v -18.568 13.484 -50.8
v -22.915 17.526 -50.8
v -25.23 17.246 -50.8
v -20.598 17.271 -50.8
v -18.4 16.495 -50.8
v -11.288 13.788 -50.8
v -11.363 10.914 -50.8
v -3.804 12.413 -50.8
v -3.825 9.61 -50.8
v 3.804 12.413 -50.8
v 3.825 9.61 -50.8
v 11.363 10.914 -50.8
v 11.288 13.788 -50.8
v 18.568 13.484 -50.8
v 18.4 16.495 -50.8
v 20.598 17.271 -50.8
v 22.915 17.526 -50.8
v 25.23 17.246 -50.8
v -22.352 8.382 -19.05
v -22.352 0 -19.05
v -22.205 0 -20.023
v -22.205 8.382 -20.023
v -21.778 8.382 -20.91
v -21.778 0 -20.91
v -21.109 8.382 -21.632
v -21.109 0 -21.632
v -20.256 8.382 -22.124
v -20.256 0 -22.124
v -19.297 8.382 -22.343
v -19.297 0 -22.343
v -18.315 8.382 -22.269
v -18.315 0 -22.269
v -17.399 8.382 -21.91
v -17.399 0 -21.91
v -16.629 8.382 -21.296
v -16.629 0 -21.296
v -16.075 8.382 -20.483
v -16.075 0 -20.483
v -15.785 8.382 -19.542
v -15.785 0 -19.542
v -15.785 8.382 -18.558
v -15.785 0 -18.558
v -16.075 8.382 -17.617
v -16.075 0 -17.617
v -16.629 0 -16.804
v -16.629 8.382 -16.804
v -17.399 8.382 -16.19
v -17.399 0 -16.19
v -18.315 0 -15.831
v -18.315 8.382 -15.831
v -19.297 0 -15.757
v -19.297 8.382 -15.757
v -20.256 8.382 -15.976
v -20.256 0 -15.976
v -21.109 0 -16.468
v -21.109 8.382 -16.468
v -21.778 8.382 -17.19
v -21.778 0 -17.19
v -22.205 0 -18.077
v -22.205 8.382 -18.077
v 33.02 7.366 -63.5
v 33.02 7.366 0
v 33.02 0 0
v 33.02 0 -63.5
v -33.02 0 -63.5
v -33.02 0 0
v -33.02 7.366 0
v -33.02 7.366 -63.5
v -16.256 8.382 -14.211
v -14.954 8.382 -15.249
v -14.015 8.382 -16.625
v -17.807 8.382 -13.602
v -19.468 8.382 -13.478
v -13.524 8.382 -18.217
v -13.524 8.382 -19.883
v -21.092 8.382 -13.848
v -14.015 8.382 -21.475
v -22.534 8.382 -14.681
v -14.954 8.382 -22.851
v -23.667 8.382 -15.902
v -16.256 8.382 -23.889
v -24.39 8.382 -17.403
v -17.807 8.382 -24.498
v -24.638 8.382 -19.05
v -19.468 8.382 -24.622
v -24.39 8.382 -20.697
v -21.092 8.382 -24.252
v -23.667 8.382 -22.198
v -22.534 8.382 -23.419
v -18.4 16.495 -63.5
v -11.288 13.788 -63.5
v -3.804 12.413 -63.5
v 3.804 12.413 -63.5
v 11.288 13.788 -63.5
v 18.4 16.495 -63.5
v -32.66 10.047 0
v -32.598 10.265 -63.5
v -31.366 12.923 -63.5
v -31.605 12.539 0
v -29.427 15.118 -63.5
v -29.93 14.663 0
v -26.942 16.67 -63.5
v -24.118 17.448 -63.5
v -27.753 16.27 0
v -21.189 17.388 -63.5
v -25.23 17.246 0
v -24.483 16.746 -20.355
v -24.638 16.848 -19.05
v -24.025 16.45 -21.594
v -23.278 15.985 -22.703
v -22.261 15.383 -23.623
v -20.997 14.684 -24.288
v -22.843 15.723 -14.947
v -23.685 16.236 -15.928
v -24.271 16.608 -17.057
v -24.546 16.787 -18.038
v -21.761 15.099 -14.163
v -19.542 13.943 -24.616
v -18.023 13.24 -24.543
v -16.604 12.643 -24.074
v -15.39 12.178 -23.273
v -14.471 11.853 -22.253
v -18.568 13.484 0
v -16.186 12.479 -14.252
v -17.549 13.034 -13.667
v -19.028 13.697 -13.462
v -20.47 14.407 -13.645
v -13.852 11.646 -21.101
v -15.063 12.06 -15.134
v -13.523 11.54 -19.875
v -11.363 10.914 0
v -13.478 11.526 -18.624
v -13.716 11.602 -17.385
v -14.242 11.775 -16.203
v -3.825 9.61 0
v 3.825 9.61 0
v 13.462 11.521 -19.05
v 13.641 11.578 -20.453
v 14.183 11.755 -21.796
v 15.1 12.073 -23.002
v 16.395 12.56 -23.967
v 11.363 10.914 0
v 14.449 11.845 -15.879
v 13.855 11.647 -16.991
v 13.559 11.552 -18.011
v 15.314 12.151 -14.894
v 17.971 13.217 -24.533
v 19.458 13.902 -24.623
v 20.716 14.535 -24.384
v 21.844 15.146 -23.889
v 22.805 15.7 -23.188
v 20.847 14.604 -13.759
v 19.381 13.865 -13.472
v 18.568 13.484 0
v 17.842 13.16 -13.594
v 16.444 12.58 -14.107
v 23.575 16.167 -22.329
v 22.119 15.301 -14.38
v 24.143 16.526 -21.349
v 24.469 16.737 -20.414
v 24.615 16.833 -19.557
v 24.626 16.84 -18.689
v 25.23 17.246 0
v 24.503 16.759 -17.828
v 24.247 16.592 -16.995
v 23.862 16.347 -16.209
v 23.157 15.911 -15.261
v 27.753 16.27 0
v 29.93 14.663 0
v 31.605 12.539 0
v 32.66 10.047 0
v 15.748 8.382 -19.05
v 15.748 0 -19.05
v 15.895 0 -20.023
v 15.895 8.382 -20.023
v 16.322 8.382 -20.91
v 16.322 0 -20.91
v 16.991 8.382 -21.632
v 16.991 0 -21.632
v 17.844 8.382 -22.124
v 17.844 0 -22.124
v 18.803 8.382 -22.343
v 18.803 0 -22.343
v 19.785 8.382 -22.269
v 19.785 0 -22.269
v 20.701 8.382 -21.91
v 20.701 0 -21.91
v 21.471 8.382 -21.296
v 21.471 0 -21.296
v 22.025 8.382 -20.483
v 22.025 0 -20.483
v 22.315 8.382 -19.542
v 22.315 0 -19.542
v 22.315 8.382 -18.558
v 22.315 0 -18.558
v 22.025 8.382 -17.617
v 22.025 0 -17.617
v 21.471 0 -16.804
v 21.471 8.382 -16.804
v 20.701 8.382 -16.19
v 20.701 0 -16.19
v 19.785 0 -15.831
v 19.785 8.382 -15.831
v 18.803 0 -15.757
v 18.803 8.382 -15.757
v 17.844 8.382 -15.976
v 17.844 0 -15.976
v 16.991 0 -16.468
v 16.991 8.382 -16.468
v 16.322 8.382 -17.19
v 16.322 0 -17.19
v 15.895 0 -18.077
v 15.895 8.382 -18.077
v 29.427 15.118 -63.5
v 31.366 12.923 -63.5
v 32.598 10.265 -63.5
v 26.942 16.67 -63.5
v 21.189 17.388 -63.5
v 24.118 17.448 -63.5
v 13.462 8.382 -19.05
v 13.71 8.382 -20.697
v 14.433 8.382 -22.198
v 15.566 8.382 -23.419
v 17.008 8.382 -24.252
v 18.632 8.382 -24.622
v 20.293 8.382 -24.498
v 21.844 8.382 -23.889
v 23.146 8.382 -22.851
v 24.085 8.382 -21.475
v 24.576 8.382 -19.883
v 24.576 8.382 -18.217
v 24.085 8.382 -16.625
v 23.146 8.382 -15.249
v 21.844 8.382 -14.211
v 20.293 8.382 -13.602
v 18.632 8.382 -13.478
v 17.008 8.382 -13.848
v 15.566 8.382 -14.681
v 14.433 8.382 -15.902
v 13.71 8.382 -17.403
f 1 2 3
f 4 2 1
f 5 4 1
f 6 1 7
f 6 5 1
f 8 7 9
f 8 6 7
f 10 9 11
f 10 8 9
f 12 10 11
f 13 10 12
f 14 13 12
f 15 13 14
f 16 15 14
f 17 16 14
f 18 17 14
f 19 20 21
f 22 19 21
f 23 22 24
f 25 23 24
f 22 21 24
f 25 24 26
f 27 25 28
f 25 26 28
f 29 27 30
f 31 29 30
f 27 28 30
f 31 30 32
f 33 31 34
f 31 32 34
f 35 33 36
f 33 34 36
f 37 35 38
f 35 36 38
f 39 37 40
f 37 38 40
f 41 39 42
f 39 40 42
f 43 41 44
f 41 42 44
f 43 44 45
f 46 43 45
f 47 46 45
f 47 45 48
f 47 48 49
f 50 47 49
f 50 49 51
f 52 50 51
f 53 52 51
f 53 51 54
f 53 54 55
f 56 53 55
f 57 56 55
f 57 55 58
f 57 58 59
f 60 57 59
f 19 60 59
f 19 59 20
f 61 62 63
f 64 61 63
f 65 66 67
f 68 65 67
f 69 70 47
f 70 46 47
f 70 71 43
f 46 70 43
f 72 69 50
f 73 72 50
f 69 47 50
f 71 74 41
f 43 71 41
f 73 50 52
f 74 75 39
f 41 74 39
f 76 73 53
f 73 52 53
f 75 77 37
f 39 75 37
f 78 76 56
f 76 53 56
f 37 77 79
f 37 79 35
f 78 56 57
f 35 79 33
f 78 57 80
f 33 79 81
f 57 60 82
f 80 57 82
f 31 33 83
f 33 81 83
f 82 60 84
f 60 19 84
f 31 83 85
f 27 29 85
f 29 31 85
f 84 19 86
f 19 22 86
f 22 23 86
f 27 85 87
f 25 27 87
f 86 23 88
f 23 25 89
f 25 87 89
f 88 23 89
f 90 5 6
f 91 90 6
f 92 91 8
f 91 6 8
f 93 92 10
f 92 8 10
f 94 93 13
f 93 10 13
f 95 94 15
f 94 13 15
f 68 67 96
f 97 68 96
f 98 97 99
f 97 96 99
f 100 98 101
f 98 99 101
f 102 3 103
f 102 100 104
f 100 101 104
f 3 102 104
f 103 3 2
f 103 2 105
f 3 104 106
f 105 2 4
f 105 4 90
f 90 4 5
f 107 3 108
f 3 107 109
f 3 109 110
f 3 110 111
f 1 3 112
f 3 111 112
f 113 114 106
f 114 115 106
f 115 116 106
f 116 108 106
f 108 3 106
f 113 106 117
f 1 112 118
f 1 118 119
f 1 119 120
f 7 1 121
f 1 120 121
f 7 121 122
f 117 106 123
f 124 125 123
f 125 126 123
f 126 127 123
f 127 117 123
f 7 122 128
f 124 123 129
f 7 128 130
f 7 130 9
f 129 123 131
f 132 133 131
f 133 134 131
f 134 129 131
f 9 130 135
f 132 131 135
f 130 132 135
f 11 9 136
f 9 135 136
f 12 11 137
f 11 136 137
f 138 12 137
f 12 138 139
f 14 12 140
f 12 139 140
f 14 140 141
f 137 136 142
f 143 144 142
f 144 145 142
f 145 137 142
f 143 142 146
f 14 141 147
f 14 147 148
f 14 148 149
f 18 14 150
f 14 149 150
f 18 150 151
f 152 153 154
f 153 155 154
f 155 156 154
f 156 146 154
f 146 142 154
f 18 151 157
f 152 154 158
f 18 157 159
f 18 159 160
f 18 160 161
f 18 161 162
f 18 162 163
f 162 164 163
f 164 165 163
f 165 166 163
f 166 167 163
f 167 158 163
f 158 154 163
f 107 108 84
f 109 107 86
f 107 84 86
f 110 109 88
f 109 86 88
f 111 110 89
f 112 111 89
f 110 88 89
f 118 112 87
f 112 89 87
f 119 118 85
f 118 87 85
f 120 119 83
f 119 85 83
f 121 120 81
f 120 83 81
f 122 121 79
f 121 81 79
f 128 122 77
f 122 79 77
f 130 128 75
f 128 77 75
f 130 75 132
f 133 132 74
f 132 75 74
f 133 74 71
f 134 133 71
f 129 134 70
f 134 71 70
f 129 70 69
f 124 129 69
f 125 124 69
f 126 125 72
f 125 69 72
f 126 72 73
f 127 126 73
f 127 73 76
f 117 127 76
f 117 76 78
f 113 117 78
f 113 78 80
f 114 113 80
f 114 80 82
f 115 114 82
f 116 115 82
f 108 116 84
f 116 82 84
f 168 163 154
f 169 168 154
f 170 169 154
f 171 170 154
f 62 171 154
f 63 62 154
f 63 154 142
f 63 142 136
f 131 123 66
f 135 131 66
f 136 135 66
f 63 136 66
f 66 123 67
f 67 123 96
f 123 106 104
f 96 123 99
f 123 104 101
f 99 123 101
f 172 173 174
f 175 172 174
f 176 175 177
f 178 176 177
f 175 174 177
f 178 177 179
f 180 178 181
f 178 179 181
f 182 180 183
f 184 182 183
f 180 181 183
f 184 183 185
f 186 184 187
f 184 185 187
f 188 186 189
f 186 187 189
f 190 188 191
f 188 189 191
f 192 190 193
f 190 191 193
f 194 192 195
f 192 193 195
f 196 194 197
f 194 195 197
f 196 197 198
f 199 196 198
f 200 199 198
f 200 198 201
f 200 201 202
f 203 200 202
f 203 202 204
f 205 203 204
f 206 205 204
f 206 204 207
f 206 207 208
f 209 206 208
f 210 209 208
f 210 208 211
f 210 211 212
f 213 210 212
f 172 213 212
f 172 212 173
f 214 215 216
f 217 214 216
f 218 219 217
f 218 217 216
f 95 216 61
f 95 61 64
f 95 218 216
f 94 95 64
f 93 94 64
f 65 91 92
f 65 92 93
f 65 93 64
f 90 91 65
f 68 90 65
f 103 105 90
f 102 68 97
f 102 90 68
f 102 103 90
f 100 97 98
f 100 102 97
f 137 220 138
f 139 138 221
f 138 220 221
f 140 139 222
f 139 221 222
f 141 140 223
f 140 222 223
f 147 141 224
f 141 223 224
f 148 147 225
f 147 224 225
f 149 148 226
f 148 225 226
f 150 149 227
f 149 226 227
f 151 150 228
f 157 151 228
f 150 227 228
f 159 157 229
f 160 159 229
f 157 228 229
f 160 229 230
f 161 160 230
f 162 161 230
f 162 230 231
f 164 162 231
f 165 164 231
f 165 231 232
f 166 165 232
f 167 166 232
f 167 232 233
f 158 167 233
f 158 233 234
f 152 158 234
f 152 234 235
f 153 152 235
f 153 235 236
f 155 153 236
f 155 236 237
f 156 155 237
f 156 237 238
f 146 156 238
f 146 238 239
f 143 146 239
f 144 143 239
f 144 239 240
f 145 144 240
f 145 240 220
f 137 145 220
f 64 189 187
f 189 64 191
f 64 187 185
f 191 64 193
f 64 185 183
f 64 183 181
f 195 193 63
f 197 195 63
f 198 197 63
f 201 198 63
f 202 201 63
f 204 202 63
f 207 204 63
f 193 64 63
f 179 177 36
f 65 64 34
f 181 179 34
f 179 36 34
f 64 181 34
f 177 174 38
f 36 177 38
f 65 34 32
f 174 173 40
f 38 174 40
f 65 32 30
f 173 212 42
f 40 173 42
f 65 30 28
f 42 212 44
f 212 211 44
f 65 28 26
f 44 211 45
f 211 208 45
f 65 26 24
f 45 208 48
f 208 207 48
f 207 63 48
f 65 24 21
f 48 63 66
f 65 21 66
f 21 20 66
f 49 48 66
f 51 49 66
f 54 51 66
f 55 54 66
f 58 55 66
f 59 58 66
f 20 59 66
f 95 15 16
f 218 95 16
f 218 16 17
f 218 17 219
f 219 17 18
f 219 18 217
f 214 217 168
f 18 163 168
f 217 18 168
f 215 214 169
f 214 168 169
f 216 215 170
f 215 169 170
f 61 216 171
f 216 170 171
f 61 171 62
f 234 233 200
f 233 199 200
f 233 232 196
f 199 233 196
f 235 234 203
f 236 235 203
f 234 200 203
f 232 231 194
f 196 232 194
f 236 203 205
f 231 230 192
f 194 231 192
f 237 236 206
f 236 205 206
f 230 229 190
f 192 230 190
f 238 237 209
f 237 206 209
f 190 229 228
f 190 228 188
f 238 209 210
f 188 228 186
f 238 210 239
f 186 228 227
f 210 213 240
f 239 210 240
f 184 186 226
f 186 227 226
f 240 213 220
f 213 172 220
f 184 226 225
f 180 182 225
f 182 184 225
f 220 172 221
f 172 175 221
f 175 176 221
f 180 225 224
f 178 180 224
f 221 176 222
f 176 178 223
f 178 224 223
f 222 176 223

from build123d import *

# Parameters (mm, degrees)
BOSS_EXTRUDE1_DEPTH = 63.5
SKETCH7_R           = 44.704
CUT_EXTRUDE1_DEPTH  = 50.8
SKETCH8_R           = 3.302
CUT_EXTRUDE2_DEPTH  = 18.526
SKETCH9_R           = 5.588
CUT_EXTRUDE3_DEPTH  = 10.144


with BuildPart() as part:
    # Sketch2 → Boss-Extrude1 (new body)
    with BuildSketch(Plane.XY):
        with BuildLine():
            Line((-33.02, 0), (-33.02, 7.366))
            ThreePointArc((-33.02, 7.366), (-28.240847698, 15.984124973), (-18.399512195, 16.494507465))
            ThreePointArc((-18.399512195, 16.494507465), (0, 12.239600759), (18.399512195, 16.494507465))
            ThreePointArc((18.399512195, 16.494507465), (28.240847698, 15.984124973), (33.02, 7.366))
            Line((33.02, 7.366), (33.02, 0))
            Line((33.02, 0), (-33.02, 0))
        make_face()
    extrude(amount=-BOSS_EXTRUDE1_DEPTH)

    # Sketch7 → Cut-Extrude1 (cut)
    with BuildSketch(Plane.XY):
        with Locations((0, 54.149600759)):
            Circle(SKETCH7_R)
    extrude(amount=-CUT_EXTRUDE1_DEPTH, mode=Mode.SUBTRACT)

    # Sketch8 → Cut-Extrude2 (cut, through all)
    with BuildSketch(Plane(origin=(0, 0, 0), x_dir=(-1, 0, 0), z_dir=(0, -1, 0))):
        with Locations((19.05, 19.05)):
            Circle(SKETCH8_R)
        with Locations((-19.05, 19.05)):
            Circle(SKETCH8_R)
    extrude(amount=-CUT_EXTRUDE2_DEPTH, mode=Mode.SUBTRACT)

    # Sketch9 → Cut-Extrude3 (cut, through all)
    with BuildSketch(Plane(origin=(0, 8.382, 0), x_dir=(-1, 0, 0), z_dir=(0, -1, 0))):
        with Locations((19.05, 19.05)):
            Circle(SKETCH9_R)
        with Locations((-19.05, 19.05)):
            Circle(SKETCH9_R)
    extrude(amount=-CUT_EXTRUDE3_DEPTH, mode=Mode.SUBTRACT)


solid = part.part
